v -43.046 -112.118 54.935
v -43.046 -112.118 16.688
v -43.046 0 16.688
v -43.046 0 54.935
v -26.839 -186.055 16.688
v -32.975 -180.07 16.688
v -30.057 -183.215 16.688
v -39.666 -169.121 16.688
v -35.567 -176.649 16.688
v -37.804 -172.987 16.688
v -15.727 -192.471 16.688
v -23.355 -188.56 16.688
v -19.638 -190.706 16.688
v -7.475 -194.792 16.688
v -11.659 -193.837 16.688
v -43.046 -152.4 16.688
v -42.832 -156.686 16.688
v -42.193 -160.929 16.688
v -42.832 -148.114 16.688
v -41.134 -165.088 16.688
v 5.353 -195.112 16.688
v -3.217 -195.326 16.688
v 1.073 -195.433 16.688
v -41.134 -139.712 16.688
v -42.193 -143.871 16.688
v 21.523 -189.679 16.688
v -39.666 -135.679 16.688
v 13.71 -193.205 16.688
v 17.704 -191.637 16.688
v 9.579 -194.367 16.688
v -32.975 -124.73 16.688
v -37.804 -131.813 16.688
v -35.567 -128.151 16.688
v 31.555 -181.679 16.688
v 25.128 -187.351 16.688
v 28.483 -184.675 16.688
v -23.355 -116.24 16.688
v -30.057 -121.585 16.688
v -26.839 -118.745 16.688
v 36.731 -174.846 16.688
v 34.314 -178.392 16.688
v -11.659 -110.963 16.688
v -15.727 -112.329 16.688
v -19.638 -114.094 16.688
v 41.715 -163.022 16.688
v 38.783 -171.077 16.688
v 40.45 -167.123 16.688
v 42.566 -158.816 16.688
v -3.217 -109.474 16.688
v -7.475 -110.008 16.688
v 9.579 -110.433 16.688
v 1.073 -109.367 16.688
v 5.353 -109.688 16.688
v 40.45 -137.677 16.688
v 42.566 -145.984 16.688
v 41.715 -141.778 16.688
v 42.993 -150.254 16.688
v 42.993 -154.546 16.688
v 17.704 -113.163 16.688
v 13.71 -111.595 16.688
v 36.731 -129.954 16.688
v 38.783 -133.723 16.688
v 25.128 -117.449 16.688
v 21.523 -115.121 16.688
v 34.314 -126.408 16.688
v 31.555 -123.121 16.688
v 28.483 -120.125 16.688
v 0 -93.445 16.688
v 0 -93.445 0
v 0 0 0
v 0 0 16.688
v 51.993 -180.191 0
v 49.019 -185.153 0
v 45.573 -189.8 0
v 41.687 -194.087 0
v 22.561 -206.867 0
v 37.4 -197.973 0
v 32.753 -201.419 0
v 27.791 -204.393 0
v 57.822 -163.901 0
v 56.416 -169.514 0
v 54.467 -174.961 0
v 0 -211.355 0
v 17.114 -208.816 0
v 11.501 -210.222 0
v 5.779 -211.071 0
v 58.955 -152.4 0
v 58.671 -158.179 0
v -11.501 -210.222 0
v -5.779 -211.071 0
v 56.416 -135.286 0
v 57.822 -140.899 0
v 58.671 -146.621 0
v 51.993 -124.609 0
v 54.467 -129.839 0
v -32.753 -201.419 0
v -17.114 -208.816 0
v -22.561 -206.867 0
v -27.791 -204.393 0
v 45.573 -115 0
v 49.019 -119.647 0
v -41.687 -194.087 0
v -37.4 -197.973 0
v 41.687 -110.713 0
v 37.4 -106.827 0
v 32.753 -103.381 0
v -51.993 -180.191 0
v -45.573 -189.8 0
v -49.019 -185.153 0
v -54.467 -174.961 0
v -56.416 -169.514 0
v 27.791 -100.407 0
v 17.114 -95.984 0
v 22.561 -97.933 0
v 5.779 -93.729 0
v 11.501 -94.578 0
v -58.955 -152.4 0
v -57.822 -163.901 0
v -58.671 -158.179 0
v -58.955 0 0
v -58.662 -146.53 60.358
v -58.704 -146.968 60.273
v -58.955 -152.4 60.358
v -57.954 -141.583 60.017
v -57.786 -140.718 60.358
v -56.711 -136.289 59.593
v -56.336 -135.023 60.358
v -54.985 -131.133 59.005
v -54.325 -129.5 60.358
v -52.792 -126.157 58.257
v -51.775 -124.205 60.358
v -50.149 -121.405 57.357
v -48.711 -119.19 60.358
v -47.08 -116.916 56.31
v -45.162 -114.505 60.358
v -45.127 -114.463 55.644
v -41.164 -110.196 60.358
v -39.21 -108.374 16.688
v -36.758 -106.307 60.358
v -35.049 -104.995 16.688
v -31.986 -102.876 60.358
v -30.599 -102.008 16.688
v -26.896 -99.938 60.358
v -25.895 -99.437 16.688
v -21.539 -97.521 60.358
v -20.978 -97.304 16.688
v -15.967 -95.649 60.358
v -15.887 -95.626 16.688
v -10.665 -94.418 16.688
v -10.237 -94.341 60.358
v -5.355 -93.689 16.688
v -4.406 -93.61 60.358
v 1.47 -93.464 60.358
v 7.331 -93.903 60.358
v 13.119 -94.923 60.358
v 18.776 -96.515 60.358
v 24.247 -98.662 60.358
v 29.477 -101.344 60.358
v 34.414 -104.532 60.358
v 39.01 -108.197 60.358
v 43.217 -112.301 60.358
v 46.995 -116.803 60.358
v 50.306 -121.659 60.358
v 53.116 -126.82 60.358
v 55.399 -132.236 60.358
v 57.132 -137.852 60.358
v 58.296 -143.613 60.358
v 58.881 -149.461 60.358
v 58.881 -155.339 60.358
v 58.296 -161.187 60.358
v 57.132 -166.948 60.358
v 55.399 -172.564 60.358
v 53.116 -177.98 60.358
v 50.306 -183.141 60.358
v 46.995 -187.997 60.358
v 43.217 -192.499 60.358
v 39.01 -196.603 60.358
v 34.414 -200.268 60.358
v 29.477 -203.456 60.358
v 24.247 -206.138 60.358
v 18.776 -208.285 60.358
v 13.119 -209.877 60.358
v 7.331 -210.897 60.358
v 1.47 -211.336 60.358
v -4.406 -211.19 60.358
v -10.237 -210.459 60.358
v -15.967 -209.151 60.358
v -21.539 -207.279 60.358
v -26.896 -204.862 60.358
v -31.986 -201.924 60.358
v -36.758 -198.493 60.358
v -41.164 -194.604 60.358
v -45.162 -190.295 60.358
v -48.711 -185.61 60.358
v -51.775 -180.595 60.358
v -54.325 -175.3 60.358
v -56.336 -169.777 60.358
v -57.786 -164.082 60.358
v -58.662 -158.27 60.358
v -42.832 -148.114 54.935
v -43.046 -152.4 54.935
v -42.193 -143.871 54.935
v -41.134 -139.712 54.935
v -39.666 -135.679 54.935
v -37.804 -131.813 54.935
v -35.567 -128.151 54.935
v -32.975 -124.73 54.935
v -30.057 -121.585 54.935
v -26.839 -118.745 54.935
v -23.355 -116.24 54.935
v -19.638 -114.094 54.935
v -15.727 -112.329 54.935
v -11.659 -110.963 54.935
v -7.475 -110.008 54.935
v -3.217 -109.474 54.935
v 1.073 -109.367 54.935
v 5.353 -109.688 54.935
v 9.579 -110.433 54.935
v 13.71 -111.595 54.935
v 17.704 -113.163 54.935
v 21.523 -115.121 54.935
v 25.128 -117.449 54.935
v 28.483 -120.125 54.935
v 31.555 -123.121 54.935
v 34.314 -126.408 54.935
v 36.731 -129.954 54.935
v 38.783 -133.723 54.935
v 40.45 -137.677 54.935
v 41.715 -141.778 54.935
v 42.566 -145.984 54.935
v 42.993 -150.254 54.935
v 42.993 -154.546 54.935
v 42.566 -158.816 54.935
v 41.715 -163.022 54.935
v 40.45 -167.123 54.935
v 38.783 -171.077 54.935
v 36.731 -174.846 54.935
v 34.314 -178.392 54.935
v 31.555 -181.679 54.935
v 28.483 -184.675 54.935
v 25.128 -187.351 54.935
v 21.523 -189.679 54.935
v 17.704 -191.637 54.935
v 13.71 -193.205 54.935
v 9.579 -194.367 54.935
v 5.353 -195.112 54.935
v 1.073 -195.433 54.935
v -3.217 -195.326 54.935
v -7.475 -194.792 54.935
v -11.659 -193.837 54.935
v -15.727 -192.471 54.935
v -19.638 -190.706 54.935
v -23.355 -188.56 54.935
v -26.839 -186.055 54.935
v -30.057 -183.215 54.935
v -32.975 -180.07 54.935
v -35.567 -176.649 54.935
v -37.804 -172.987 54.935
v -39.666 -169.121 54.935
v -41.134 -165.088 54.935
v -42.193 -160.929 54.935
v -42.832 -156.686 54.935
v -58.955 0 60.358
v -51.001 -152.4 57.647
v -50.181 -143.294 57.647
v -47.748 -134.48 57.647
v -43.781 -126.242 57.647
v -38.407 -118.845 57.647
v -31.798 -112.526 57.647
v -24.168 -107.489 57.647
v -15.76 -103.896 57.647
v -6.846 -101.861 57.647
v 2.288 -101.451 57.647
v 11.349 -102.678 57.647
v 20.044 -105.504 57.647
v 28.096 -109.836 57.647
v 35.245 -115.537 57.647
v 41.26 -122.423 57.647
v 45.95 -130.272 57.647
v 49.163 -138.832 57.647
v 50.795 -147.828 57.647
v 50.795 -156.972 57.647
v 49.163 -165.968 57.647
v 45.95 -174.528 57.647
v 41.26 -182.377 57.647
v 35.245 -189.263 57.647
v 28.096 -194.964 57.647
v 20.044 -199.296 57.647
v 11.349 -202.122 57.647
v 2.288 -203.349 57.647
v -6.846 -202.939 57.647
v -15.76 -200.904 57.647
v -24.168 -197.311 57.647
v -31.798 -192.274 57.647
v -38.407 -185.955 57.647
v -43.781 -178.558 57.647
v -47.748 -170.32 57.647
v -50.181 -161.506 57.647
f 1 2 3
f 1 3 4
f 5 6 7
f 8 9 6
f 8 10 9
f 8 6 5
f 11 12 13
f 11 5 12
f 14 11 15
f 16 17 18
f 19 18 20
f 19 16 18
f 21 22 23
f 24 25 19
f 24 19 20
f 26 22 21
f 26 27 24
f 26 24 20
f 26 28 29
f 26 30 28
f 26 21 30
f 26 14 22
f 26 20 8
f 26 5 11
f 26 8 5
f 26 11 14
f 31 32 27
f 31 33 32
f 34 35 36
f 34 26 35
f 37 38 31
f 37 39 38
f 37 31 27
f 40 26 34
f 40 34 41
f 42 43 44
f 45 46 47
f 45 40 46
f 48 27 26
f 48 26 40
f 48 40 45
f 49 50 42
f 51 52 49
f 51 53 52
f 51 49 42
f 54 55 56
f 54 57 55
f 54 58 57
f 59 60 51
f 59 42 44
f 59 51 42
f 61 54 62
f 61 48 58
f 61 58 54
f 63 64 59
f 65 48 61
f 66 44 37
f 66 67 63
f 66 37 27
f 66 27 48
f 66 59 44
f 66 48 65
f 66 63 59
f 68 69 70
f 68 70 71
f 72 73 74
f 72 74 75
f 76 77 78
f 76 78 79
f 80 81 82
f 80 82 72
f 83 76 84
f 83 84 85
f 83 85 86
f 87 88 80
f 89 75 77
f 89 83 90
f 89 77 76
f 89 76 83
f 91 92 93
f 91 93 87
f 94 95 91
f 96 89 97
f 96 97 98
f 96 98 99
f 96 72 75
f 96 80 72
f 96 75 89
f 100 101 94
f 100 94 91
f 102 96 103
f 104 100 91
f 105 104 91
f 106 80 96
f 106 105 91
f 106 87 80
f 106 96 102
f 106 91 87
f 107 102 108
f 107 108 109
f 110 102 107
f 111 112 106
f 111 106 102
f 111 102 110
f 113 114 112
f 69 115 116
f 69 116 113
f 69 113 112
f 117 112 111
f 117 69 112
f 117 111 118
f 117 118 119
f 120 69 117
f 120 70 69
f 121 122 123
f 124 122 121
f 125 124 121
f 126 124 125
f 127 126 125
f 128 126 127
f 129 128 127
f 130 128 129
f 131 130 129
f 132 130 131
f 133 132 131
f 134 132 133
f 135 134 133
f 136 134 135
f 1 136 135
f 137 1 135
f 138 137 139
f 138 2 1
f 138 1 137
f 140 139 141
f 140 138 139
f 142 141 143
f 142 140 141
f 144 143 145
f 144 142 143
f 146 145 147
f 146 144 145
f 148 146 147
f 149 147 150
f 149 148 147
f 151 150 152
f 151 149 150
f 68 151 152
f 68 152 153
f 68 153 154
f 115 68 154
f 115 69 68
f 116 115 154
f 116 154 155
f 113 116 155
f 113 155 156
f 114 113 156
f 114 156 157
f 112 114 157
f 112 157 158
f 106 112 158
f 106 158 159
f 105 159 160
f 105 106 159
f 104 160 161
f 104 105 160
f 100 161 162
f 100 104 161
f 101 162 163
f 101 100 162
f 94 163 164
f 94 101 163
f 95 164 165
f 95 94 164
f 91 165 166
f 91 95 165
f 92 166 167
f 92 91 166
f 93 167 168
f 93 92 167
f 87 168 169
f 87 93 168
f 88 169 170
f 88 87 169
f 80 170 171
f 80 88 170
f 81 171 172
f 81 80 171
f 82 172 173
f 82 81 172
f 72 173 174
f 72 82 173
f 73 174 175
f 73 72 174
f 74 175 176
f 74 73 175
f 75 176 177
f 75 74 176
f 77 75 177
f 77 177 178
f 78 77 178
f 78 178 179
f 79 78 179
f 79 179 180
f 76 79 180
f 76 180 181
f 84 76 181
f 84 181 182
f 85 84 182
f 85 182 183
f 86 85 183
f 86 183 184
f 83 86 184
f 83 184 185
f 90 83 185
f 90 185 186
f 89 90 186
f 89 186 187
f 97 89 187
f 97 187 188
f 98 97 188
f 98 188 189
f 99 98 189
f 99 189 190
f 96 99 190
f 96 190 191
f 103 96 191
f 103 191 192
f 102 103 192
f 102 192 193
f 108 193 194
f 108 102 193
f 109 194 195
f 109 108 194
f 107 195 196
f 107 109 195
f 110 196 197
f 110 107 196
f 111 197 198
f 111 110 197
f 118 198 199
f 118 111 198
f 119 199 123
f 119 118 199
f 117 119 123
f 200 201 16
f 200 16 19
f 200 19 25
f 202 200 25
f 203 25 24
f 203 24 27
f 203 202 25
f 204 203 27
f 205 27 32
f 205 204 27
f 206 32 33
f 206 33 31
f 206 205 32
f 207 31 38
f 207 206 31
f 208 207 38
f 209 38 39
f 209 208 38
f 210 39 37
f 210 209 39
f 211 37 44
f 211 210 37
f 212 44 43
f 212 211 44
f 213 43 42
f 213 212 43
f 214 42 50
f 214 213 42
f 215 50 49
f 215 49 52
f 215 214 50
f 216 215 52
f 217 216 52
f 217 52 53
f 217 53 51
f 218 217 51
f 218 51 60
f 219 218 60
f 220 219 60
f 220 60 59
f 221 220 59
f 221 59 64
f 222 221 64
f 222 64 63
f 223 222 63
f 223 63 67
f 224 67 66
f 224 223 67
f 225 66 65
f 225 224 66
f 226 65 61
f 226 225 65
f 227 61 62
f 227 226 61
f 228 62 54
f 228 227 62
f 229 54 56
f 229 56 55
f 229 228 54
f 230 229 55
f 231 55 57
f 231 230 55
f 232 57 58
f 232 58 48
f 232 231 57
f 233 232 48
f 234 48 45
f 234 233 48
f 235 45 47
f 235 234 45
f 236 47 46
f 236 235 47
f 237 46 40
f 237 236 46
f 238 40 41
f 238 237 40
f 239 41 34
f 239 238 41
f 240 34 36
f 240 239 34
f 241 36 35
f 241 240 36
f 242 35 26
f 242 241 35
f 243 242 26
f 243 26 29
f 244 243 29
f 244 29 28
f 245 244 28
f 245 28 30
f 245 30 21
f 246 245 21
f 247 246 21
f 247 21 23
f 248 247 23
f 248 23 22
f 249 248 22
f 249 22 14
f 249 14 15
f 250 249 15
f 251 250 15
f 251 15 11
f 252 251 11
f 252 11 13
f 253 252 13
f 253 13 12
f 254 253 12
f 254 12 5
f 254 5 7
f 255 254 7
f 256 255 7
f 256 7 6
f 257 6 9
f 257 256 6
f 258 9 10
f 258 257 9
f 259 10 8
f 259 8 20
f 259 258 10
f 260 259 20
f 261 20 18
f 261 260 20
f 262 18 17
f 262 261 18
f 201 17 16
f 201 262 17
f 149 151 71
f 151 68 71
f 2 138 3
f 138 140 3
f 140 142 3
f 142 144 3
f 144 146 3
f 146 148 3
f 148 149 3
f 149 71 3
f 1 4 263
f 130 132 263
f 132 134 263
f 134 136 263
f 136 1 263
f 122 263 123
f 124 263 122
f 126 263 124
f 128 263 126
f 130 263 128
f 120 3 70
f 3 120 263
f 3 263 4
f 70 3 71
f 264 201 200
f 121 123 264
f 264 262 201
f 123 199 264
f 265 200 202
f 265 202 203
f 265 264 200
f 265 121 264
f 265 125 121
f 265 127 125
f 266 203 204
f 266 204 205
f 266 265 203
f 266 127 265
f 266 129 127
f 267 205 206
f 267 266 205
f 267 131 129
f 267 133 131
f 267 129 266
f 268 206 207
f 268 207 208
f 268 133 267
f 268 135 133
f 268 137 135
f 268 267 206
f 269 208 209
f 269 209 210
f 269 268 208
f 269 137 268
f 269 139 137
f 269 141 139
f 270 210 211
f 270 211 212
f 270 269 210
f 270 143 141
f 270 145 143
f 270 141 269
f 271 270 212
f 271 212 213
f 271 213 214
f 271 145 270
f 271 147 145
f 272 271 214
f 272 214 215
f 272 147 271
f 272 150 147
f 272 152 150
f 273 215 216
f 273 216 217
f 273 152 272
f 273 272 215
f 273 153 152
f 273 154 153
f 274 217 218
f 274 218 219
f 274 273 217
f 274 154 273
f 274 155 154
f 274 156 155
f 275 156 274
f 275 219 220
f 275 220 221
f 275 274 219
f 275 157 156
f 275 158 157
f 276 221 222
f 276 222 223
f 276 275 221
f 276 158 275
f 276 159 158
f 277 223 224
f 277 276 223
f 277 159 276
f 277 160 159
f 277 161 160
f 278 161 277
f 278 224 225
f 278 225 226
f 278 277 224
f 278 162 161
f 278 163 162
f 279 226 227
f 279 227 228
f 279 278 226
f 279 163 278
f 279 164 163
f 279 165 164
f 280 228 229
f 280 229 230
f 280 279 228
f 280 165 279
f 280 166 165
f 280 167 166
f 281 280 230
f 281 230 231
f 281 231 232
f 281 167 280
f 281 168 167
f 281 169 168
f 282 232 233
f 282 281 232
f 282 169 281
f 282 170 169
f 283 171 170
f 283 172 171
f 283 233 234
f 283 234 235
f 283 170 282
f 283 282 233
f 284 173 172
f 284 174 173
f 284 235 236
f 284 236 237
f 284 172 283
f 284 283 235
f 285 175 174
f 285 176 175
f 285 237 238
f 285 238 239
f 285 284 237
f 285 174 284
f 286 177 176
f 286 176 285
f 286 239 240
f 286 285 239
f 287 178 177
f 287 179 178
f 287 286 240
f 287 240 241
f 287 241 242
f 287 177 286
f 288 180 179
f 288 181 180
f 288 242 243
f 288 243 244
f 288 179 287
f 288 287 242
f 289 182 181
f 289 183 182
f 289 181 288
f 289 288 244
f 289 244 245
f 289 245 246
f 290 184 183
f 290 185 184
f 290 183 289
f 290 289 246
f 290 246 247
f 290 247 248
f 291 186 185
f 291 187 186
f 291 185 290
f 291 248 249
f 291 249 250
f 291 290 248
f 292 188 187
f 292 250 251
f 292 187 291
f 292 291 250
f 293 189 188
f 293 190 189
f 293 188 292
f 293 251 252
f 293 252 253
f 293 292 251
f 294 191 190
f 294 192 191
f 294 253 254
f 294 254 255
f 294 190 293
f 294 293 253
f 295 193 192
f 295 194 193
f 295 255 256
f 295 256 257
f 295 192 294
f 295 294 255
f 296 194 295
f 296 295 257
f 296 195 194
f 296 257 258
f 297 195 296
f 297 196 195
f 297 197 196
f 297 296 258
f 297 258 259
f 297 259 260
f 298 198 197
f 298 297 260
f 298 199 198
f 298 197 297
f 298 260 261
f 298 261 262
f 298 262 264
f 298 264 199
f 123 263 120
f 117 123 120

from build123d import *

# Parameters (mm, degrees)
F1_DEPTH = 152.4


with BuildPart() as f1:
    # F0 (on Front) → F1 (new body)
    with BuildSketch(Plane.XZ):
        Polygon((-58.954738, 0), (0, 0), (0, 16.688244), (-43.046318, 16.688244), (-43.046318, 30.101229), (-43.046318, 54.935103), (-58.954738, 60.358422), align=None)
    extrude(amount=F1_DEPTH)

    # F1_face (on face) → F2 (revolve)
    with BuildSketch(Plane(origin=(-38.122493, -152.4, 19.839762), x_dir=(1, 0, 0), z_dir=(0, -1, 0))):
        Polygon((-20.832245, 40.51866), (-20.832245, -19.839762), (38.122493, -19.839762), (38.122493, -3.151518), (-4.923825, -3.151518), (-4.923825, 35.095341), align=None)
    revolve(axis=Axis((0, -152.4, 8.344122), (0, 0, -1)))


solid = f1.part
